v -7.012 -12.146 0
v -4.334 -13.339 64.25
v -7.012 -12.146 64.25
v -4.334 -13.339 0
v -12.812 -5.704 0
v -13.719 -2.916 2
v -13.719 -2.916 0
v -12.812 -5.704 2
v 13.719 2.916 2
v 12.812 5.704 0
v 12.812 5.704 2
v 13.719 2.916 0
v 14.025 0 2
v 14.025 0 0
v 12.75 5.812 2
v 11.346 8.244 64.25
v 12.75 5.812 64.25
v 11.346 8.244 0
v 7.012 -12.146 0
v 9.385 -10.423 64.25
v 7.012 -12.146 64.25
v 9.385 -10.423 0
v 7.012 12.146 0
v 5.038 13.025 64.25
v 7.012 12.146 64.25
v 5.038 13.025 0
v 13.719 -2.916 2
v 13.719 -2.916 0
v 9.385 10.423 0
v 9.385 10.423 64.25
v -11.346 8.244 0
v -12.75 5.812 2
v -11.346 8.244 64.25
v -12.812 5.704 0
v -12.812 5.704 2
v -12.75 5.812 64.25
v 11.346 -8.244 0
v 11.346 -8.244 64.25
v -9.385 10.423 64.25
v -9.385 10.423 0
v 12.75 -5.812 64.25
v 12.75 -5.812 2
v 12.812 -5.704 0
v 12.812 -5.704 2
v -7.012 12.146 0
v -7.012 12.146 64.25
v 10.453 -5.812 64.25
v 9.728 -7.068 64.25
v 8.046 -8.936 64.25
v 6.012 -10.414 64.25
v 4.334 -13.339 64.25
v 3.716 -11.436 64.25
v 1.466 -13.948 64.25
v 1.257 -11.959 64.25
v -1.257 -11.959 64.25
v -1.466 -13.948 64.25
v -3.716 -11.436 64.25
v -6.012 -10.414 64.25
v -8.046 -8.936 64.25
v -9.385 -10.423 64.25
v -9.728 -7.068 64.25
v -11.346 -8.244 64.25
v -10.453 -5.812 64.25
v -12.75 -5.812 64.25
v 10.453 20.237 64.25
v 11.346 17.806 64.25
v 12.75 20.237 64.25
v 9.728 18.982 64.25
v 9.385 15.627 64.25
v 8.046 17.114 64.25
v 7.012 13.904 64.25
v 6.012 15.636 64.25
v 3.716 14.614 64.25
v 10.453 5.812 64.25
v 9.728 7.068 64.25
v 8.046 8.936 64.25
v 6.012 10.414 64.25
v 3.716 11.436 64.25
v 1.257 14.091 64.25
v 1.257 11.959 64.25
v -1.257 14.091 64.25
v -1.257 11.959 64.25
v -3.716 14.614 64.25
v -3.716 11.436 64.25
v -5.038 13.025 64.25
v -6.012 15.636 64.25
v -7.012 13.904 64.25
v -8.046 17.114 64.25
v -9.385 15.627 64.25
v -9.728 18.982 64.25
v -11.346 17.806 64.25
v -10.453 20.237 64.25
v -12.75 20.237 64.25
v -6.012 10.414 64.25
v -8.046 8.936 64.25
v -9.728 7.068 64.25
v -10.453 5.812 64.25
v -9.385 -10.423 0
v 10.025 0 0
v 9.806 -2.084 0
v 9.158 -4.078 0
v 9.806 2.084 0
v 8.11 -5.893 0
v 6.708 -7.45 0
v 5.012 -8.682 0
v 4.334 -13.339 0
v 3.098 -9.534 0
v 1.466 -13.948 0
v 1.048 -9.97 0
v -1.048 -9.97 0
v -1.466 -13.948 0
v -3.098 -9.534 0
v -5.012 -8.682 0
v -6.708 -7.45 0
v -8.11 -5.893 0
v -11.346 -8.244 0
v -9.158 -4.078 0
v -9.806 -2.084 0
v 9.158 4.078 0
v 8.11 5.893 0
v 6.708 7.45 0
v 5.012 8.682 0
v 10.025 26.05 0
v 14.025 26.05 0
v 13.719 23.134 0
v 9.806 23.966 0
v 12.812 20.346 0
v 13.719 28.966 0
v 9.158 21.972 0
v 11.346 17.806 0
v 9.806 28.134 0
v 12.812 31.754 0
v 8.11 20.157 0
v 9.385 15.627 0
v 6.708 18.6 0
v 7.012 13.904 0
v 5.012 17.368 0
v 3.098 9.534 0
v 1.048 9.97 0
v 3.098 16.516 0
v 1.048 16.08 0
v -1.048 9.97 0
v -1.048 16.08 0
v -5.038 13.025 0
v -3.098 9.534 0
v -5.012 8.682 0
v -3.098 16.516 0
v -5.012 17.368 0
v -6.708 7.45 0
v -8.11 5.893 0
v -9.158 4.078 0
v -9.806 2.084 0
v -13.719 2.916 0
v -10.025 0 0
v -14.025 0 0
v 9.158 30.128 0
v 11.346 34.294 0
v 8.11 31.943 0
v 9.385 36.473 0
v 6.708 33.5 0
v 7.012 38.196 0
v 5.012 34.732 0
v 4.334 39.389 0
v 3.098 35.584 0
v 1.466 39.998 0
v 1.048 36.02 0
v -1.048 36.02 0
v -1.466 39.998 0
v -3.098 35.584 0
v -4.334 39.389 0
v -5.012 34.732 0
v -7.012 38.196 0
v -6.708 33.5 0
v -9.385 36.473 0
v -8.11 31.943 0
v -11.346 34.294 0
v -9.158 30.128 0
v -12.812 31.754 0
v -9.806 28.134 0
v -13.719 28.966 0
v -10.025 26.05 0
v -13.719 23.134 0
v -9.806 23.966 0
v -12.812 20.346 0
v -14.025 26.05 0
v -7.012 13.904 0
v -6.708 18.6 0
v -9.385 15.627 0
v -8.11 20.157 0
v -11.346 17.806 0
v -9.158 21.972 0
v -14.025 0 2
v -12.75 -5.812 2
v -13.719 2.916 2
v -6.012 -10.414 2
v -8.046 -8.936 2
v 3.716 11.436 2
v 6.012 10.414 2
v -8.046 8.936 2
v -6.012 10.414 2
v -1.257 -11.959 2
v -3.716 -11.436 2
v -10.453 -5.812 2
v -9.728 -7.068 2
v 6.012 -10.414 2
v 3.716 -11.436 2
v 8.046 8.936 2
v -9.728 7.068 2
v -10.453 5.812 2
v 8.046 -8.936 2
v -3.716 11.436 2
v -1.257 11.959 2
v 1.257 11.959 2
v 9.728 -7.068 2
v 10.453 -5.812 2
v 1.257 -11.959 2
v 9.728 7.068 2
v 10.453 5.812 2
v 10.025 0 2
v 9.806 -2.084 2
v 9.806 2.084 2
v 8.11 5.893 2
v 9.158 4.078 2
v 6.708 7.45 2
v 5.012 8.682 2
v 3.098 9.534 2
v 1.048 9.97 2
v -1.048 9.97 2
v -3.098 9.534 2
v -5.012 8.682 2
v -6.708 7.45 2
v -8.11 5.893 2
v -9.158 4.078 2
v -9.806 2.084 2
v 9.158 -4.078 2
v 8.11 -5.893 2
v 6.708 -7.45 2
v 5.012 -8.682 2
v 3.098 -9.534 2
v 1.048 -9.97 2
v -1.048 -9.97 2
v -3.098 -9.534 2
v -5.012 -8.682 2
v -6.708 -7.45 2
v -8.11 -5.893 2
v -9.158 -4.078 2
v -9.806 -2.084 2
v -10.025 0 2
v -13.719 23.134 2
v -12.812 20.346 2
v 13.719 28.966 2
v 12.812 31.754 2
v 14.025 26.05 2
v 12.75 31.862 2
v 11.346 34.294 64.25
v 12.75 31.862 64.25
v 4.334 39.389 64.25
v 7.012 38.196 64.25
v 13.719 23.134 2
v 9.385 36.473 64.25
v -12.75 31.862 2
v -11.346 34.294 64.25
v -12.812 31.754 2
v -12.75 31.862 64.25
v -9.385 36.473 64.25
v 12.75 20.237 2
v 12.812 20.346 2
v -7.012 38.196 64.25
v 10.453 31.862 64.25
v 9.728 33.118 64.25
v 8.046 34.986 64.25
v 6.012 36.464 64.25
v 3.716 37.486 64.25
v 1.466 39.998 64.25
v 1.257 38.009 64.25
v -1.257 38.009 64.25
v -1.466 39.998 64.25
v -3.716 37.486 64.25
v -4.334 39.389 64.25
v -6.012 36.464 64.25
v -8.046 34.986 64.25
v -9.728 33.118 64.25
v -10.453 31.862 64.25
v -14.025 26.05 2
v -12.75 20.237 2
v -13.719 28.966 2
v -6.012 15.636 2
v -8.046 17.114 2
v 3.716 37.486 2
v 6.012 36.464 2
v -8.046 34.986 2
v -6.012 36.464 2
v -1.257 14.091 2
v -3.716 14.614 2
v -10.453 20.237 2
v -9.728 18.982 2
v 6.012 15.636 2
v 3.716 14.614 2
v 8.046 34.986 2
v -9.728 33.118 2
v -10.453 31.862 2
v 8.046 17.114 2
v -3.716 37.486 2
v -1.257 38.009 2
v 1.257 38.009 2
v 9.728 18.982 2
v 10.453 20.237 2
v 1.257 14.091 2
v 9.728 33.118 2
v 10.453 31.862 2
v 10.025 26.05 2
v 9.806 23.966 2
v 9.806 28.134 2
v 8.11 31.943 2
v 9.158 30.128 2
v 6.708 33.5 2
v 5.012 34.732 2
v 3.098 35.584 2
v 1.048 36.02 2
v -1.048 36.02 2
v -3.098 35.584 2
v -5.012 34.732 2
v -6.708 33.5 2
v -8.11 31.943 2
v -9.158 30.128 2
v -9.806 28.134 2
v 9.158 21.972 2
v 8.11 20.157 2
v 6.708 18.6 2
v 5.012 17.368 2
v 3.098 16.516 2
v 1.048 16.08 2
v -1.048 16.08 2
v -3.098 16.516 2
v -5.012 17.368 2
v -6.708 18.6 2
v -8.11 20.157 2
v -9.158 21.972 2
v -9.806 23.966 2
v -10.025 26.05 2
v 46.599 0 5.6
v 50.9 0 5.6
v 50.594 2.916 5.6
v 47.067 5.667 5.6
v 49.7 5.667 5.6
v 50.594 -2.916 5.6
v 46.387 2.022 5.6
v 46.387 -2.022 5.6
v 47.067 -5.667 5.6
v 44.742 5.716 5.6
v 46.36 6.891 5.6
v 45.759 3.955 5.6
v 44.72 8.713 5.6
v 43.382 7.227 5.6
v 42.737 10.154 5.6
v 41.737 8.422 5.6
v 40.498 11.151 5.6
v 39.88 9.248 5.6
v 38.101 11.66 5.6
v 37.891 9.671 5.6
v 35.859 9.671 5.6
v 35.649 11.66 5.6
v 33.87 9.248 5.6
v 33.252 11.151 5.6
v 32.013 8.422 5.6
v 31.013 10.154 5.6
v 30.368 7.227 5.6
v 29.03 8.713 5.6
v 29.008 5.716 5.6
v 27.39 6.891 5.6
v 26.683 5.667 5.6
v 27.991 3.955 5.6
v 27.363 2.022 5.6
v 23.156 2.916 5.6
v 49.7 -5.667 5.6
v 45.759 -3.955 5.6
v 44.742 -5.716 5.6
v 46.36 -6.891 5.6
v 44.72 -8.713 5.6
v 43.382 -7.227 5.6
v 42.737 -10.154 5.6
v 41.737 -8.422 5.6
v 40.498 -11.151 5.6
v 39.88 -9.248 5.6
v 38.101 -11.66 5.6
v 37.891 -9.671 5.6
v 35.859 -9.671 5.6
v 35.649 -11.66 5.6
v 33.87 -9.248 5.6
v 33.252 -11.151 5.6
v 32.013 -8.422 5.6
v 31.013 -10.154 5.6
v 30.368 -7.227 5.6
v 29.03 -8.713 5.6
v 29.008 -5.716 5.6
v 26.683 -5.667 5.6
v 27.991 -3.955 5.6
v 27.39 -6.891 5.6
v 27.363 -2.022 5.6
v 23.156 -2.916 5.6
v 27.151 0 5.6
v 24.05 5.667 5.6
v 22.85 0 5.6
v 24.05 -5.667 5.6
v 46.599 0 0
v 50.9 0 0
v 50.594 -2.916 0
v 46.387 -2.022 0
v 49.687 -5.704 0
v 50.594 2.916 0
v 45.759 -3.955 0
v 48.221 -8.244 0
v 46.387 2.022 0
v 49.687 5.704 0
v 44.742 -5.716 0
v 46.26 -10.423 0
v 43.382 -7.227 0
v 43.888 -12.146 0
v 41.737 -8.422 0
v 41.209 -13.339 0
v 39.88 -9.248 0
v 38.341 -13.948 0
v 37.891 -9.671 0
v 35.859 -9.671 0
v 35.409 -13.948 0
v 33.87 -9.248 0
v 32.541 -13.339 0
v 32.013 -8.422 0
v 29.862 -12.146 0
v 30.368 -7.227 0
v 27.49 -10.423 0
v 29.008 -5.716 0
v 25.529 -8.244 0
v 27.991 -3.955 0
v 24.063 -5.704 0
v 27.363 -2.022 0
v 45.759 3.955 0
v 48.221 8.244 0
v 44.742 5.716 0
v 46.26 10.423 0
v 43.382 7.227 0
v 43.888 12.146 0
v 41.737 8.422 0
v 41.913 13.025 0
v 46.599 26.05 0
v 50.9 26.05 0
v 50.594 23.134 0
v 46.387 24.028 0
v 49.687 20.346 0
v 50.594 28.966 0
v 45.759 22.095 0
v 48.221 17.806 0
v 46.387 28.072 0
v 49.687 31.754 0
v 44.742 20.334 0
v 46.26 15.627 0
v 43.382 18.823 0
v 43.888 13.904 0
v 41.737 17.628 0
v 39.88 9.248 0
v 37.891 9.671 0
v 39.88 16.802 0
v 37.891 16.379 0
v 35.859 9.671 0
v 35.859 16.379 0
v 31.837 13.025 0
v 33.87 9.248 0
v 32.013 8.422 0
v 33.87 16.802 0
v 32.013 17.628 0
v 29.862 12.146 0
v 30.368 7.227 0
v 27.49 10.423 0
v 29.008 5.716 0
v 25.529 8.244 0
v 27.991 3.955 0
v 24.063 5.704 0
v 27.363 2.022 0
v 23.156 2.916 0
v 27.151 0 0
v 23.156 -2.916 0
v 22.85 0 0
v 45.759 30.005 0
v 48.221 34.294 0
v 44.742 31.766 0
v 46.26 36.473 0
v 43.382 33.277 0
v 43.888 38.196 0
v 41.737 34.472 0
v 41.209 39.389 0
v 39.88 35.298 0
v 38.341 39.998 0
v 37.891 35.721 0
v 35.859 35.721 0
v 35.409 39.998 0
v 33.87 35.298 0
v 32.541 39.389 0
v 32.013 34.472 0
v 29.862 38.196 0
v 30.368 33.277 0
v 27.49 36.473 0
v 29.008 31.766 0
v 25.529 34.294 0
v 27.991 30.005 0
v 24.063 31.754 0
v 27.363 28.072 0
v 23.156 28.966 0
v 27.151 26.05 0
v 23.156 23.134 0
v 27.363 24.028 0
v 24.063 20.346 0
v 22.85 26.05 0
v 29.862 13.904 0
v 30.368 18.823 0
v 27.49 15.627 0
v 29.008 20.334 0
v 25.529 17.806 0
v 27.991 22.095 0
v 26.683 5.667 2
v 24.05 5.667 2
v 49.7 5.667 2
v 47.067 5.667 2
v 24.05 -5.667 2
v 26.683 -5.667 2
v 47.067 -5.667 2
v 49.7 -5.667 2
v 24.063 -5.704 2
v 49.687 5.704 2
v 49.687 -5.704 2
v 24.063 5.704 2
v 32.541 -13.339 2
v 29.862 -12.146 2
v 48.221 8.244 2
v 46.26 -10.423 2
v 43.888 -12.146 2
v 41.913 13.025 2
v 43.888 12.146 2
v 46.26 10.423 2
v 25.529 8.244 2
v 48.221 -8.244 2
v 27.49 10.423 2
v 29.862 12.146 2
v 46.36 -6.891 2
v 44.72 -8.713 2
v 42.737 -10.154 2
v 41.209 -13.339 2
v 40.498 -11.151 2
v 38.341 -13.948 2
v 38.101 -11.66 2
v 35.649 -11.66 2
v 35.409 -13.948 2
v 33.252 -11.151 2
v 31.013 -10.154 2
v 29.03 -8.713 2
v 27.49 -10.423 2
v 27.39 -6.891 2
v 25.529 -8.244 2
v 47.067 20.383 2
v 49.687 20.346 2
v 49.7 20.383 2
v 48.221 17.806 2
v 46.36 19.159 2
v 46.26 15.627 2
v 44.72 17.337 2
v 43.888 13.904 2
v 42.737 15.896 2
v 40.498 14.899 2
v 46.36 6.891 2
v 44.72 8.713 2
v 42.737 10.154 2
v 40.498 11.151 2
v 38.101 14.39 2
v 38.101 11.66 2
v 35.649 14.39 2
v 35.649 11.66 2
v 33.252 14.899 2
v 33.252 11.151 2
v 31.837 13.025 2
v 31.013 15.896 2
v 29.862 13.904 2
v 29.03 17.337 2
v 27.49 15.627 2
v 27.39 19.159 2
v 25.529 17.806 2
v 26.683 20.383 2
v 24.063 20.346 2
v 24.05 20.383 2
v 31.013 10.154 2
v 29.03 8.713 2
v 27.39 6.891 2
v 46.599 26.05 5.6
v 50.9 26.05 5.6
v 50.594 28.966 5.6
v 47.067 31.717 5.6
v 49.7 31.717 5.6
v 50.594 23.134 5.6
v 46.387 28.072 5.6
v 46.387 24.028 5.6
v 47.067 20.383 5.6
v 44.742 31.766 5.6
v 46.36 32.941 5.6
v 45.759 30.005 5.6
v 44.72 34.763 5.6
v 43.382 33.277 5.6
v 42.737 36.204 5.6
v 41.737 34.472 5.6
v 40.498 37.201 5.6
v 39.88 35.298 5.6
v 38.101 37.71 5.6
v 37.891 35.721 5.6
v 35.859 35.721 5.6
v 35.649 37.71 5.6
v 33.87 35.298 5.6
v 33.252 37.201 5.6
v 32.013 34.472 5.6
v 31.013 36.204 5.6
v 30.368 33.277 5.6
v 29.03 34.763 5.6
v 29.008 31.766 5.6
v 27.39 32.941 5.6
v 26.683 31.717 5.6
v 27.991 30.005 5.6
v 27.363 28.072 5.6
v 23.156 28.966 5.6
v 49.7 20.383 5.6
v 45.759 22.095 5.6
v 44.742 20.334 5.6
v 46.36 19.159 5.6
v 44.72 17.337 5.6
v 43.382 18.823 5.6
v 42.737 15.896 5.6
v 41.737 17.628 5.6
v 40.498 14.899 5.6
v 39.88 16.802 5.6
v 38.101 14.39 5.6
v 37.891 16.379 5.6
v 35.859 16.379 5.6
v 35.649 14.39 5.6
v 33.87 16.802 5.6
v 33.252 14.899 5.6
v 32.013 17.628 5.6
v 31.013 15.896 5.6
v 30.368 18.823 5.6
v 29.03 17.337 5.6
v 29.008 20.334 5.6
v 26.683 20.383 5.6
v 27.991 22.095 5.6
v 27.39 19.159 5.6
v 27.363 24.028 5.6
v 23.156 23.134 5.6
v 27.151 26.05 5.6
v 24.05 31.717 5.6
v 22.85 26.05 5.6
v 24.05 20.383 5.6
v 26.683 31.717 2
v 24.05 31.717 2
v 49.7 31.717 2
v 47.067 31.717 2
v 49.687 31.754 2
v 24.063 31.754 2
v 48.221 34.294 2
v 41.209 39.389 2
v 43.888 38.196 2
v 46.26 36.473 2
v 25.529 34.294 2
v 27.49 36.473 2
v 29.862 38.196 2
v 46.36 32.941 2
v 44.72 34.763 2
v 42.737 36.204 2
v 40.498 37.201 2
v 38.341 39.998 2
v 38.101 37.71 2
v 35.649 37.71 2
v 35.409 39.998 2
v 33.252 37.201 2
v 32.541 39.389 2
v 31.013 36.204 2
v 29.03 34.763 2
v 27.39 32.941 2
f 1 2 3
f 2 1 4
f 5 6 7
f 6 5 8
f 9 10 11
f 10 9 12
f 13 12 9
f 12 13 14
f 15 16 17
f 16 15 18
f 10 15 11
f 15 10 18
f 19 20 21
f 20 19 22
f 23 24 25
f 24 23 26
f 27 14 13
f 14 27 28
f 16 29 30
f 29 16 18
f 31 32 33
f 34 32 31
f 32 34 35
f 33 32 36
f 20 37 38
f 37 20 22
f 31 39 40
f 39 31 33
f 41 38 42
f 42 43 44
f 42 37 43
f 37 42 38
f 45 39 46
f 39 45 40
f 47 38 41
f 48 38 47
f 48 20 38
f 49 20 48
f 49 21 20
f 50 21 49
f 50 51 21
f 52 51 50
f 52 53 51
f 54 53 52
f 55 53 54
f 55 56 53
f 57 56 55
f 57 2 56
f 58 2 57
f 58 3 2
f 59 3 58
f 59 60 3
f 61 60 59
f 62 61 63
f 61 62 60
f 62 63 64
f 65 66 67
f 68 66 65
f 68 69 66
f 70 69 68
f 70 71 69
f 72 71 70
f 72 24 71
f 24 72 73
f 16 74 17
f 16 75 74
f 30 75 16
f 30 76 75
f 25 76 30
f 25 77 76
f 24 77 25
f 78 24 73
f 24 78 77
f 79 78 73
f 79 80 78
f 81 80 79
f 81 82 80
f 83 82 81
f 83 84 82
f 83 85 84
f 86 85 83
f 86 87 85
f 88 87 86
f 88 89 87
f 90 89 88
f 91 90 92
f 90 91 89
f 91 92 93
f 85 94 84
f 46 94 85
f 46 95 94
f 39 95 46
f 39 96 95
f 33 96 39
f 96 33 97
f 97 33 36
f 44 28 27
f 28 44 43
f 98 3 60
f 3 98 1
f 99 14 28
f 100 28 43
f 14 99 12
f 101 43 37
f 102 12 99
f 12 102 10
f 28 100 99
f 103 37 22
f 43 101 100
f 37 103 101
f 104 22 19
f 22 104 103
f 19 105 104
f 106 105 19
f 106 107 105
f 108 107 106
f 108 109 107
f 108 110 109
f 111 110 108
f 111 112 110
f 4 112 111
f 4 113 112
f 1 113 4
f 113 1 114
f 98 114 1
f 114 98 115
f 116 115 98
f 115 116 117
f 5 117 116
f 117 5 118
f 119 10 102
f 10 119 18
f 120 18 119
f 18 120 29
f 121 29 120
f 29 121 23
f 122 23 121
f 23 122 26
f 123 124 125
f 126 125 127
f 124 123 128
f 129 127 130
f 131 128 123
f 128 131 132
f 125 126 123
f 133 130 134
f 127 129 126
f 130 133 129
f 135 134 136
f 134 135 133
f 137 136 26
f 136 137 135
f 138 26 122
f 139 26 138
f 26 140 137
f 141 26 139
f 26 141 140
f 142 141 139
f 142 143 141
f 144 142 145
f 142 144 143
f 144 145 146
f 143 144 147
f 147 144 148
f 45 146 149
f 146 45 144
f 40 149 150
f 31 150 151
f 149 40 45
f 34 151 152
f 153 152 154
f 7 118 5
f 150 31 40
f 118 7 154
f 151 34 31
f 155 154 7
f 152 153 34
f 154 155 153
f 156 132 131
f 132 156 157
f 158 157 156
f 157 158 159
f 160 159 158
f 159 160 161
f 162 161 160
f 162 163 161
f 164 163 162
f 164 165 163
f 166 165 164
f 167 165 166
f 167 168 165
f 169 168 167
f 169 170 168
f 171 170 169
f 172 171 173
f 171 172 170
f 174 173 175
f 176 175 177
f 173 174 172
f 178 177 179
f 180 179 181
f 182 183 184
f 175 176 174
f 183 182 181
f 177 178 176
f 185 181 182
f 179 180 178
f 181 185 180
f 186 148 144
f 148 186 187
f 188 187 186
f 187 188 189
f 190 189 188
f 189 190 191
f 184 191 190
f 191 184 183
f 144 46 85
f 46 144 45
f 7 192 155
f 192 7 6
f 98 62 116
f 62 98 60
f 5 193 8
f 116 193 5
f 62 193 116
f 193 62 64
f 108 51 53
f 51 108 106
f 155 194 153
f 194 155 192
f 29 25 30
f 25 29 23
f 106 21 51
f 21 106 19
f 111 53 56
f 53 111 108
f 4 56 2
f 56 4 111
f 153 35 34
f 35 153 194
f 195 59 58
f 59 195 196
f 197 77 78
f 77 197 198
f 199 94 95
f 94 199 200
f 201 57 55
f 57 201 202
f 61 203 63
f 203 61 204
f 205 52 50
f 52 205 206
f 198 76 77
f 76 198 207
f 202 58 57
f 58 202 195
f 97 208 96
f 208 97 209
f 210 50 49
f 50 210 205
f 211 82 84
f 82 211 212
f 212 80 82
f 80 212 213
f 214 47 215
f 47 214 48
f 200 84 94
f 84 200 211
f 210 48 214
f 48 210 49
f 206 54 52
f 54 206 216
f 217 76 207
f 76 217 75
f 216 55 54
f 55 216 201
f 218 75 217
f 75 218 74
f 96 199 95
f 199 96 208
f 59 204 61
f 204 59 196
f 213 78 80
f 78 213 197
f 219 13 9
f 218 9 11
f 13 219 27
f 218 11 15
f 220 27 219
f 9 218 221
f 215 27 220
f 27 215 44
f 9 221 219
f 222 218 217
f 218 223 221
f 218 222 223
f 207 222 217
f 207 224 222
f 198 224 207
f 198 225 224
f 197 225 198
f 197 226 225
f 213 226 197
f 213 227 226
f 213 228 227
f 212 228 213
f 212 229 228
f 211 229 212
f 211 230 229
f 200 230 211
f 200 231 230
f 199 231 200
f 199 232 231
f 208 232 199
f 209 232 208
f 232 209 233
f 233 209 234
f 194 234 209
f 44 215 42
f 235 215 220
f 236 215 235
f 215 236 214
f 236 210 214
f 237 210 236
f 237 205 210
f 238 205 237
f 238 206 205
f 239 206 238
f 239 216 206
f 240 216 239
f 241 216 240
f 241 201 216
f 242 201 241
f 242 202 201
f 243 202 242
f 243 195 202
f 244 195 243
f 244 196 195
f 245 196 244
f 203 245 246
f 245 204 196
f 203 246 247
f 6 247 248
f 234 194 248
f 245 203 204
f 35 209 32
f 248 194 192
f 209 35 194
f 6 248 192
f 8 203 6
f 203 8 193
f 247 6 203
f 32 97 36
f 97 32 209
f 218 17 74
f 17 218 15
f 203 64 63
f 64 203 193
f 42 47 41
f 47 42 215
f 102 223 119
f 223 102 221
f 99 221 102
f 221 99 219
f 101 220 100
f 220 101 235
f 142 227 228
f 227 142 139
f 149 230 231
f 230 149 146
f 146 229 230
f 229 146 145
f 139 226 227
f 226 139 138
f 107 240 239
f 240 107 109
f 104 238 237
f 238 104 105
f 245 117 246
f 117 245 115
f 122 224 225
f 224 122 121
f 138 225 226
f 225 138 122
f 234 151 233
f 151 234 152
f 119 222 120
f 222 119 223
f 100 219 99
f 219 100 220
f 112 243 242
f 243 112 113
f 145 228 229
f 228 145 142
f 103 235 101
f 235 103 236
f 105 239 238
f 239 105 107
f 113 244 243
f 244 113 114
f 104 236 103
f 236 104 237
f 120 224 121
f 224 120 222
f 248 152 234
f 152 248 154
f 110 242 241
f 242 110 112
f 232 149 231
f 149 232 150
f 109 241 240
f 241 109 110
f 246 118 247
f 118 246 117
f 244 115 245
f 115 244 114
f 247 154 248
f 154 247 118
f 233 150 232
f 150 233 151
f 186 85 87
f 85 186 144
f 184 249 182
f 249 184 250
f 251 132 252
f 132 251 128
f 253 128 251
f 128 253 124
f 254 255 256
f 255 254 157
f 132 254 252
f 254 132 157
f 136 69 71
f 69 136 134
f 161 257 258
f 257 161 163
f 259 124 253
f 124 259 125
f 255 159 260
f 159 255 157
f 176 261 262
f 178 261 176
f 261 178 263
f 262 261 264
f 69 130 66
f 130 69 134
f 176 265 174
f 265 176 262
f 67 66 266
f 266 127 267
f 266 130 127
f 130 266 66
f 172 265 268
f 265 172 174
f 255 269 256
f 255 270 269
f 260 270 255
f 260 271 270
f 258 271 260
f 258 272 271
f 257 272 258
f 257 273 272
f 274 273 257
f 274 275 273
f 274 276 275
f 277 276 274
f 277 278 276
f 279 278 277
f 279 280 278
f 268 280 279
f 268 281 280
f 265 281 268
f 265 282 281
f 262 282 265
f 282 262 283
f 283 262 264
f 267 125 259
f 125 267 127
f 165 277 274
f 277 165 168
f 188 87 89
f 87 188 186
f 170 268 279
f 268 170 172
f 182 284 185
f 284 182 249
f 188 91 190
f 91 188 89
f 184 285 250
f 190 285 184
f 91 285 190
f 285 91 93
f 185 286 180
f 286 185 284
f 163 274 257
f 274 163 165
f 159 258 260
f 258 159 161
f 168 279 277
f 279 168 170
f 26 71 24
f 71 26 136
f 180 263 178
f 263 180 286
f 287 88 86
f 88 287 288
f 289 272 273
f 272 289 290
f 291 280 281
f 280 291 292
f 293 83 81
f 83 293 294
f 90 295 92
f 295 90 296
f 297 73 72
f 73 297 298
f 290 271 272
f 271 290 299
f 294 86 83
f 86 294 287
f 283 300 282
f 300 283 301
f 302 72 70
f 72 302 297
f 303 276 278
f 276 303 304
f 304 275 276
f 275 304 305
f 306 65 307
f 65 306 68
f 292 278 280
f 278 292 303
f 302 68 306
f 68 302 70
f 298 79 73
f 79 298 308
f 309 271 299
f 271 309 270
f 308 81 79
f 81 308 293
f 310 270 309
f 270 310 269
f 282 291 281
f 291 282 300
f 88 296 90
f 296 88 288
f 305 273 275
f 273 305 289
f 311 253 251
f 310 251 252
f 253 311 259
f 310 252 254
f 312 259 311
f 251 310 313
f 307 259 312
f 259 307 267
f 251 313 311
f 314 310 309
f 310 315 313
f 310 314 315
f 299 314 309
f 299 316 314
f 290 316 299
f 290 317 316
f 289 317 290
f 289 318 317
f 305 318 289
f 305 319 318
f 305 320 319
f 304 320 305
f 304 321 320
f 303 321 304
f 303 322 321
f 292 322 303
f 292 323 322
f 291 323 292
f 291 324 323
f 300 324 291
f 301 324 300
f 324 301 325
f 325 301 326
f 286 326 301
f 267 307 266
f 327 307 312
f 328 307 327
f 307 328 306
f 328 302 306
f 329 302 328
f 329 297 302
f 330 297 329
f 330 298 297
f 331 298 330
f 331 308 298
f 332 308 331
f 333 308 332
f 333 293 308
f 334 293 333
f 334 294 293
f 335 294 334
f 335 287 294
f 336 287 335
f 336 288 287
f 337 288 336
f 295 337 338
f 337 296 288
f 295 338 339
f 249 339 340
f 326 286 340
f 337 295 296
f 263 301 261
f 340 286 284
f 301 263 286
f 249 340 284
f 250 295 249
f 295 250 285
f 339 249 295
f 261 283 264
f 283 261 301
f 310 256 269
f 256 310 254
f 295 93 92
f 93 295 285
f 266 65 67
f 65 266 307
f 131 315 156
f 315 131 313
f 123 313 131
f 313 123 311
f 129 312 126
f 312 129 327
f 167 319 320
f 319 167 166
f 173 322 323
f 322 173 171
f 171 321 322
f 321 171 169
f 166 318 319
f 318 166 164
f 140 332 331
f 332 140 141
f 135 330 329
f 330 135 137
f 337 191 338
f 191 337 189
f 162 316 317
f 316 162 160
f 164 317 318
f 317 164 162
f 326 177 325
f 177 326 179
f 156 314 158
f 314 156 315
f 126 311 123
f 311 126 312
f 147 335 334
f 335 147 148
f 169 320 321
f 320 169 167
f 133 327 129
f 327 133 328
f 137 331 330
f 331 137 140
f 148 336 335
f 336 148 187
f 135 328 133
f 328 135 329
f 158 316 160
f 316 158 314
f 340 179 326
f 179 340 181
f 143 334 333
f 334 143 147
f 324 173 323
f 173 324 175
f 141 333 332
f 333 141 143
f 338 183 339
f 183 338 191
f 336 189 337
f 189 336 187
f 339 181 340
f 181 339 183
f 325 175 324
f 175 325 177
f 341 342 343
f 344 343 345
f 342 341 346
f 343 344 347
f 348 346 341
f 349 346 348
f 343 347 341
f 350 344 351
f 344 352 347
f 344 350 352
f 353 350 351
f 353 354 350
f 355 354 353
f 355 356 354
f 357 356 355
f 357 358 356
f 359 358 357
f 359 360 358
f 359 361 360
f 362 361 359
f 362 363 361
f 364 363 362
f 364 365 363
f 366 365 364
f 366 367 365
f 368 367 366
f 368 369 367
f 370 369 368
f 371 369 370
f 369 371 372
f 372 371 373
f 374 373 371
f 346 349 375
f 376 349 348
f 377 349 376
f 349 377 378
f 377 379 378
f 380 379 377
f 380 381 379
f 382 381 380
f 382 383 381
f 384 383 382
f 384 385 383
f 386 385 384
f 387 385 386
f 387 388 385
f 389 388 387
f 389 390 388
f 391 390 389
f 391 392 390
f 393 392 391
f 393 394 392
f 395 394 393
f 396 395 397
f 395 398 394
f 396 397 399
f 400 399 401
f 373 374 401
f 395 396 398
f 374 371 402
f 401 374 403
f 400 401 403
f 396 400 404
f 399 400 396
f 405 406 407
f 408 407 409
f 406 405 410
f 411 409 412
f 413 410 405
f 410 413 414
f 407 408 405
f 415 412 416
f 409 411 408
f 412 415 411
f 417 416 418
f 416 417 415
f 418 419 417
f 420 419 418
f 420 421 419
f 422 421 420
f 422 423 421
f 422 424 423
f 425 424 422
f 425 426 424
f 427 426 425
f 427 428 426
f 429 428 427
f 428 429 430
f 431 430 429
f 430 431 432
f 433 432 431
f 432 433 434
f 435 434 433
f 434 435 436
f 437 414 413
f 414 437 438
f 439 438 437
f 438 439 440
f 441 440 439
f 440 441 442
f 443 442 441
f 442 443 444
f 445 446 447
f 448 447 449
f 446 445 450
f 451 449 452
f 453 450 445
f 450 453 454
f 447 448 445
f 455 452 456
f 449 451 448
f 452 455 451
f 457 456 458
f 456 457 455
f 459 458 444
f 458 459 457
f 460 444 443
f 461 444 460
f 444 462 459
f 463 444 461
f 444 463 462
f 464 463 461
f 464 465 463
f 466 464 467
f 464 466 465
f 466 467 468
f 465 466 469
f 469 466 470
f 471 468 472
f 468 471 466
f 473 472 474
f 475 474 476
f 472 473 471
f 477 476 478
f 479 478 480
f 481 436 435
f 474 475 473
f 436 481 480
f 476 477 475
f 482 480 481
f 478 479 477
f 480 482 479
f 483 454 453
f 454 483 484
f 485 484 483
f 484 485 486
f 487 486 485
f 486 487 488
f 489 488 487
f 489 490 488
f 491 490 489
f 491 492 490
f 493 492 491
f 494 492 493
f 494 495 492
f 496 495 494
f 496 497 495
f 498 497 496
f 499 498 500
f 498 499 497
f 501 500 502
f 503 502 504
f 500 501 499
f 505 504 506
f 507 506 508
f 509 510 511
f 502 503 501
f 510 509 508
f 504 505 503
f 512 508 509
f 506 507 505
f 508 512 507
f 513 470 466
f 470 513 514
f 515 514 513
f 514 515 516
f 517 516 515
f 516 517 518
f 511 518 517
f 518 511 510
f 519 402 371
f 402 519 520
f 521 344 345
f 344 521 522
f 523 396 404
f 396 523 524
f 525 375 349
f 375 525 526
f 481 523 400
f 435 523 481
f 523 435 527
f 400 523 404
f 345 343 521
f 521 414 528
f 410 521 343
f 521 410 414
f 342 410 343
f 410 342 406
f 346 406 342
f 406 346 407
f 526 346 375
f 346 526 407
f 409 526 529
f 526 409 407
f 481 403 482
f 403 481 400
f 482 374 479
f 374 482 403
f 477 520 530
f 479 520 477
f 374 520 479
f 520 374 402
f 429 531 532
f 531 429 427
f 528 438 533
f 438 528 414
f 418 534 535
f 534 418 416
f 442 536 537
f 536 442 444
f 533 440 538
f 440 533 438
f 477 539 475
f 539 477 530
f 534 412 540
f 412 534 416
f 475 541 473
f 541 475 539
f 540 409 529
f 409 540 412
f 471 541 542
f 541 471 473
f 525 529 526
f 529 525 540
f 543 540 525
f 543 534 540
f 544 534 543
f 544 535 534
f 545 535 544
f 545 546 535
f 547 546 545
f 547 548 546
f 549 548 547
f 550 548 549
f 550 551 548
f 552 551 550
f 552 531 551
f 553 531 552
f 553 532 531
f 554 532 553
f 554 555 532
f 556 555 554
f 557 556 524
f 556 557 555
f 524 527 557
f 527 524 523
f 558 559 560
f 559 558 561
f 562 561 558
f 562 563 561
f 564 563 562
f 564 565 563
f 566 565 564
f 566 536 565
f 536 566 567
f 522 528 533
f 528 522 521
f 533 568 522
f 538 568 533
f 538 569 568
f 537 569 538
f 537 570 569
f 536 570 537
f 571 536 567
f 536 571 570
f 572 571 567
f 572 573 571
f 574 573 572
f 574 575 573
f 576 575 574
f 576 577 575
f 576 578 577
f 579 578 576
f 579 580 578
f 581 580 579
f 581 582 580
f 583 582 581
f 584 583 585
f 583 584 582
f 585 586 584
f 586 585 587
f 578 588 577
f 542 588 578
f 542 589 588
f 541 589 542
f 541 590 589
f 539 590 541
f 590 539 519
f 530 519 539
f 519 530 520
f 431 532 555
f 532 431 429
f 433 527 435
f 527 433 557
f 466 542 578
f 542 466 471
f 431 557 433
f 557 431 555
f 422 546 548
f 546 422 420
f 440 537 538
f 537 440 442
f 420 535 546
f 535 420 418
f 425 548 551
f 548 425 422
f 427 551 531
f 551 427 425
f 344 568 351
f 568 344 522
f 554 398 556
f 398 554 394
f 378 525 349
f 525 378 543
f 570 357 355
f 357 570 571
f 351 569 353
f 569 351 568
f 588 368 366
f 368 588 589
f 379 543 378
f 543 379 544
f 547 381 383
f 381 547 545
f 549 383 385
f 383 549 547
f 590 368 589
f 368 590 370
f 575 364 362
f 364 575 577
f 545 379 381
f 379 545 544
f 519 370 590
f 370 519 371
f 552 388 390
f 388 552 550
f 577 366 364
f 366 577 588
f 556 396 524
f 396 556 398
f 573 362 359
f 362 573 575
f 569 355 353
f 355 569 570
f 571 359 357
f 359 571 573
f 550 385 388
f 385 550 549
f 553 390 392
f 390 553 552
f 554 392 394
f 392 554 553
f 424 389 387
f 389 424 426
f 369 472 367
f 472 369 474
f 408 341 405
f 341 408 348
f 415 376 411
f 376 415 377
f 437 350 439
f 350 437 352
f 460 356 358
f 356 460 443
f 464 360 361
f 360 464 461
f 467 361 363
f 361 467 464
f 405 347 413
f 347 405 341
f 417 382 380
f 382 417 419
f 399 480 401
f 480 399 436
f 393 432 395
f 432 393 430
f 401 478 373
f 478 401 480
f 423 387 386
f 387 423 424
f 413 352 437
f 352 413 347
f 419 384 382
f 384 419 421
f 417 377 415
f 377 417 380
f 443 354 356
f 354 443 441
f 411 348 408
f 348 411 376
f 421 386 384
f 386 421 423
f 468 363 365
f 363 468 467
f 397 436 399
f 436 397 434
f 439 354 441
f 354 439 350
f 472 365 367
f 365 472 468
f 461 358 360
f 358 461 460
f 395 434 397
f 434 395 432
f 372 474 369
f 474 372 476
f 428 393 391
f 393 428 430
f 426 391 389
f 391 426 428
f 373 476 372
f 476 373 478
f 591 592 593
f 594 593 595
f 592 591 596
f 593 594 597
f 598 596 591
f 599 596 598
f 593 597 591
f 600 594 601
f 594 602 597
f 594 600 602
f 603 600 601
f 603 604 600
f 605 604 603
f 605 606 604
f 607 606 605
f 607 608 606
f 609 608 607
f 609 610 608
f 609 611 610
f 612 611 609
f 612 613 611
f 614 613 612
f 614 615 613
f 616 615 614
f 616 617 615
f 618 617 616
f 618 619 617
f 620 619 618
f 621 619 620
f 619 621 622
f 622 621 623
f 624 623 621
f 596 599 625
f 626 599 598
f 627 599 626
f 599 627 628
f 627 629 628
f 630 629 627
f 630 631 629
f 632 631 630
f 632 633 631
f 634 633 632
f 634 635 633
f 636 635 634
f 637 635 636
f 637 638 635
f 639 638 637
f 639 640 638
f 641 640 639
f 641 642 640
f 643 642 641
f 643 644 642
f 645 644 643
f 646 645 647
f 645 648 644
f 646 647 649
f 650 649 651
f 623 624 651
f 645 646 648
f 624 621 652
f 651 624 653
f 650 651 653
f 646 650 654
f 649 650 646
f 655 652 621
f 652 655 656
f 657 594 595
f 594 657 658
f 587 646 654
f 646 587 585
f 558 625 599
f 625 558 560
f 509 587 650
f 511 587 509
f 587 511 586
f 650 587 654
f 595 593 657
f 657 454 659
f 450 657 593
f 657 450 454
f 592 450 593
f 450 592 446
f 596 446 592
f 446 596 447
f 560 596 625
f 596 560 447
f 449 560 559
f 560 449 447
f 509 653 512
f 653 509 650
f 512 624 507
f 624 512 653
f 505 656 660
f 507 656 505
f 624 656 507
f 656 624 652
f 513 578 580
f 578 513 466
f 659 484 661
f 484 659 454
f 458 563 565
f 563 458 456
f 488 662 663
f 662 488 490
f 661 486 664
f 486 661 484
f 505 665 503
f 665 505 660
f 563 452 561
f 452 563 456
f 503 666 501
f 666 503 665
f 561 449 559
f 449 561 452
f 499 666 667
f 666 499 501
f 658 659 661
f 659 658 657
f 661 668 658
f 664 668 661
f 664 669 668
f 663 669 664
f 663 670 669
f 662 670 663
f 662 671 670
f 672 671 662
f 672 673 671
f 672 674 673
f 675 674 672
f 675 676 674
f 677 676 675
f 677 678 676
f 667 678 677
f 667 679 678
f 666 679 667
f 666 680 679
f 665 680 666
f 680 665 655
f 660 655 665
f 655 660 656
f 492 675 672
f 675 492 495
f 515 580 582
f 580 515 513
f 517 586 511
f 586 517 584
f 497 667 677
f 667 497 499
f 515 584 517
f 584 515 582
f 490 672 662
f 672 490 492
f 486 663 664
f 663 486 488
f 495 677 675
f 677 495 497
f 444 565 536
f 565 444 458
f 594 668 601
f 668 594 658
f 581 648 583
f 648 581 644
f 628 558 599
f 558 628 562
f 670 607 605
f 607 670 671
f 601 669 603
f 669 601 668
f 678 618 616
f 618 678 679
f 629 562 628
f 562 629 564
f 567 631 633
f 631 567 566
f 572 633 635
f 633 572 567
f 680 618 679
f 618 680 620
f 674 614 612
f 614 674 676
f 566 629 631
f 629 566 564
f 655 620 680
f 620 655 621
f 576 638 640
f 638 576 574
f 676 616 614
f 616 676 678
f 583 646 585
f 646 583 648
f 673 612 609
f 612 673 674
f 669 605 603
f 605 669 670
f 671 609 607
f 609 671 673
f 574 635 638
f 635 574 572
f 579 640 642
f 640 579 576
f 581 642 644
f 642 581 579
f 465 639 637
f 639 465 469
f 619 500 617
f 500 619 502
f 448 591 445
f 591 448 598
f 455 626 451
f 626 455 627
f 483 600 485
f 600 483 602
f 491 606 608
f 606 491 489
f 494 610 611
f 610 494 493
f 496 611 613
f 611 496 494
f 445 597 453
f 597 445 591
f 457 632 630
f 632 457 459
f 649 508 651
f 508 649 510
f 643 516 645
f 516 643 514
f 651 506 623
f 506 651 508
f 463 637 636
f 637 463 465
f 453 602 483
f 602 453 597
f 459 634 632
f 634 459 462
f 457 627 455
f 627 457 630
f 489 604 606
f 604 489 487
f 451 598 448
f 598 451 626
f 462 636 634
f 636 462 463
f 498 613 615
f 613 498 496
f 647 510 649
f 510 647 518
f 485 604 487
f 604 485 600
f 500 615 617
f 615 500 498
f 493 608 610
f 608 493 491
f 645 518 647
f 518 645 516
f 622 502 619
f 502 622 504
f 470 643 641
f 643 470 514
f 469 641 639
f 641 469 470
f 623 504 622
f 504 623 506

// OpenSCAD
/*
 * PARAMETRIC COIN TUBES + CAP
 * VERSION 1.3.1
 * last update: 02/12/13
 * design by newq 
 * mod kitwallace (thanks!)
 */

// 
// the generated tubes insides are 2 coins higher than the number of coins they fit

coin_type = 0; // [ 0:1 Euro, 1:2 Euro, 2:50 Euro cents,  3:20 Euro cents, 4:10 Euro cents, 5:5 Euro cents, 6:2 Euro cent, 7: 1 Euro cent, 8: 1 US Dollar, 9: 0.50 US Dollar, 10: 0.25 US Dollar, 11: 0.10 US Dollar, 12: 0.05 US Dollar, 13: 0.01 US Dollar, 14: 2 Canadian Dollar, 15: 1 Canadian Dollar, 16: 0.50 Canadian Dollar, 17: 0.25 Canadian Dollar, 18: 0.10 Canadian Dollar, 19: 0.05 Canadian Dollar, 20: 0.01 Canadian Dollar, 21: 10 ATS Silver, 22: 5 ATS Silver]

// how many stacked coins should fit in a tube
number_of_coins = 25; 
number_of_tubes = 2; 

// Do you want to print the tubes?
generate_tube = 1; // [1:Yes, 0:No] 
// Do you want a cap to close the tube?
generate_cap = 1; // [1:Yes, 0:No] 
// thickness of wall and bottom (mm)
tube_wall = 2;  
// clearance from coin to wall of tube (mm) 
clearance = 0.4;
// if the cap fits too tight you might decrease slightly
fudge_factor = 0.975; 

// NOTHING TO SEE HERE :)

// coin data - name, diameter, height
coins = [ 
              ["1 Euro", 23.25, 2.33], 
              ["2 Euro", 25.75, 2.20],
              ["50 Euro cents", 24.25, 2.38],
              ["20 Euro cents", 22.25, 2.14],
              ["10 Euro cents", 19.75, 1.93],
              ["5 Euro cents", 21.25, 1.67],
              ["2 Euro cents", 18.75, 1.67],
              ["1 Euro cents", 16.25, 1.67],
              ["1 US Dollar", 26.50, 2.00],
              ["0.50 US Dollar", 30.61, 2.15],
              ["0.25 US Dollar", 24.26, 1.75],
              ["0.10 US Dollar", 17.91, 1.35],
              ["0.05 US Dollar", 21.21, 1.95],
              ["0.01 US Dollar", 19.05, 1.55],
              ["2 Canadian Dollar", 28.00, 1.80],
              ["1 Canadian Dollar", 26.50, 1.75],
              ["0.50 Canadian Dollar", 27.13, 1.95],
              ["0.25 Canadian Dollar", 23.88, 1.58],
              ["0.10 Canadian Dollar", 18.03, 1.22],
              ["0.05 Canadian Dollar", 21.2, 1.76],
              ["0.01 Canadian Dollar", 19.05, 1.45],
              ["10 ATS Silver", 27.05, 1.62],
              ["5 ATS Silver", 23.55, 1.35]
            ];

coin_diameter = coins[coin_type][1];
coin_height = coins[coin_type][2];

// generating the tubes
if (generate_tube) {
  assign(cyl_inner_h = (coin_height * number_of_coins) + (4 * tube_wall),
             cyl_inner_r = (coin_diameter / 2) + clearance,

             cyl_outer_h = (coin_height * number_of_coins) + (3 * tube_wall),
             cyl_outer_r = (coin_diameter / 2) + tube_wall + clearance,

             cutout_x = coin_diameter + (4 * tube_wall),
             cutout_y = (coin_diameter / 2),
             cutout_z = (coin_height * number_of_coins) + (3 * tube_wall)
             )


  for (z = [0 : (number_of_tubes-1)]){

	translate (v = [0, z * (cyl_outer_r * 2 - tube_wall), 0]){
		difference(){	
			difference(){
				difference() {
					// outer tube
					cylinder(h = cyl_outer_h, r = cyl_outer_r);
					// inner tube
					translate(v = [0, 0, tube_wall]) {
						cylinder(h = cyl_inner_h, r = cyl_inner_r);
					}
				}
				// round bottom cutout
				translate (v = [0, 0, ((cutout_z / 2) + tube_wall)]){
					cube(size = [cutout_x, cutout_y, cutout_z], center = true);
				}
			}
			// cutout
			translate (v = [0, 0, -tube_wall]){
				cylinder(h = (cyl_inner_h + tube_wall), r = (cyl_inner_r - tube_wall));
			}
		}
   }
}

}

// generating the tube tops

if (generate_cap) {
   assign (cyl_inner_h = 3*tube_wall - clearance,
               cyl_inner_r = ((coin_diameter / 2) + clearance) * fudge_factor,

               cyl_outer_h = tube_wall,
               cyl_outer_r = (coin_diameter / 2) + tube_wall + clearance,

               cutout_x = coin_diameter + (4 * tube_wall),
               cutout_y = (coin_diameter / 2) * fudge_factor,
               cutout_z = 3*tube_wall - clearance
             )
    translate([1.5 * coin_diameter + tube_wall, 0, 0]){
	for (z = [0 : (number_of_tubes-1)]){
		
		translate (v = [0, z * (cyl_outer_r * 2 - tube_wall), 0]){
			difference(){
				union(){		
					cylinder(h = cyl_outer_h, r = cyl_outer_r);
					cylinder(h = cyl_inner_h, r = cyl_inner_r);
				
					intersection(){
						translate([0,0,cutout_z/2]){
							cube(size = [cutout_x, cutout_y, cutout_z], center = true);
						}
						cylinder(h = cyl_outer_h+10, r = cyl_outer_r);
					}
				}
				
				translate([0,0,-(cyl_inner_h /2)]){
					cylinder(h = cyl_inner_h *2, r = cyl_inner_r - tube_wall);
				}			
			}		
		}
	}	
}
}
